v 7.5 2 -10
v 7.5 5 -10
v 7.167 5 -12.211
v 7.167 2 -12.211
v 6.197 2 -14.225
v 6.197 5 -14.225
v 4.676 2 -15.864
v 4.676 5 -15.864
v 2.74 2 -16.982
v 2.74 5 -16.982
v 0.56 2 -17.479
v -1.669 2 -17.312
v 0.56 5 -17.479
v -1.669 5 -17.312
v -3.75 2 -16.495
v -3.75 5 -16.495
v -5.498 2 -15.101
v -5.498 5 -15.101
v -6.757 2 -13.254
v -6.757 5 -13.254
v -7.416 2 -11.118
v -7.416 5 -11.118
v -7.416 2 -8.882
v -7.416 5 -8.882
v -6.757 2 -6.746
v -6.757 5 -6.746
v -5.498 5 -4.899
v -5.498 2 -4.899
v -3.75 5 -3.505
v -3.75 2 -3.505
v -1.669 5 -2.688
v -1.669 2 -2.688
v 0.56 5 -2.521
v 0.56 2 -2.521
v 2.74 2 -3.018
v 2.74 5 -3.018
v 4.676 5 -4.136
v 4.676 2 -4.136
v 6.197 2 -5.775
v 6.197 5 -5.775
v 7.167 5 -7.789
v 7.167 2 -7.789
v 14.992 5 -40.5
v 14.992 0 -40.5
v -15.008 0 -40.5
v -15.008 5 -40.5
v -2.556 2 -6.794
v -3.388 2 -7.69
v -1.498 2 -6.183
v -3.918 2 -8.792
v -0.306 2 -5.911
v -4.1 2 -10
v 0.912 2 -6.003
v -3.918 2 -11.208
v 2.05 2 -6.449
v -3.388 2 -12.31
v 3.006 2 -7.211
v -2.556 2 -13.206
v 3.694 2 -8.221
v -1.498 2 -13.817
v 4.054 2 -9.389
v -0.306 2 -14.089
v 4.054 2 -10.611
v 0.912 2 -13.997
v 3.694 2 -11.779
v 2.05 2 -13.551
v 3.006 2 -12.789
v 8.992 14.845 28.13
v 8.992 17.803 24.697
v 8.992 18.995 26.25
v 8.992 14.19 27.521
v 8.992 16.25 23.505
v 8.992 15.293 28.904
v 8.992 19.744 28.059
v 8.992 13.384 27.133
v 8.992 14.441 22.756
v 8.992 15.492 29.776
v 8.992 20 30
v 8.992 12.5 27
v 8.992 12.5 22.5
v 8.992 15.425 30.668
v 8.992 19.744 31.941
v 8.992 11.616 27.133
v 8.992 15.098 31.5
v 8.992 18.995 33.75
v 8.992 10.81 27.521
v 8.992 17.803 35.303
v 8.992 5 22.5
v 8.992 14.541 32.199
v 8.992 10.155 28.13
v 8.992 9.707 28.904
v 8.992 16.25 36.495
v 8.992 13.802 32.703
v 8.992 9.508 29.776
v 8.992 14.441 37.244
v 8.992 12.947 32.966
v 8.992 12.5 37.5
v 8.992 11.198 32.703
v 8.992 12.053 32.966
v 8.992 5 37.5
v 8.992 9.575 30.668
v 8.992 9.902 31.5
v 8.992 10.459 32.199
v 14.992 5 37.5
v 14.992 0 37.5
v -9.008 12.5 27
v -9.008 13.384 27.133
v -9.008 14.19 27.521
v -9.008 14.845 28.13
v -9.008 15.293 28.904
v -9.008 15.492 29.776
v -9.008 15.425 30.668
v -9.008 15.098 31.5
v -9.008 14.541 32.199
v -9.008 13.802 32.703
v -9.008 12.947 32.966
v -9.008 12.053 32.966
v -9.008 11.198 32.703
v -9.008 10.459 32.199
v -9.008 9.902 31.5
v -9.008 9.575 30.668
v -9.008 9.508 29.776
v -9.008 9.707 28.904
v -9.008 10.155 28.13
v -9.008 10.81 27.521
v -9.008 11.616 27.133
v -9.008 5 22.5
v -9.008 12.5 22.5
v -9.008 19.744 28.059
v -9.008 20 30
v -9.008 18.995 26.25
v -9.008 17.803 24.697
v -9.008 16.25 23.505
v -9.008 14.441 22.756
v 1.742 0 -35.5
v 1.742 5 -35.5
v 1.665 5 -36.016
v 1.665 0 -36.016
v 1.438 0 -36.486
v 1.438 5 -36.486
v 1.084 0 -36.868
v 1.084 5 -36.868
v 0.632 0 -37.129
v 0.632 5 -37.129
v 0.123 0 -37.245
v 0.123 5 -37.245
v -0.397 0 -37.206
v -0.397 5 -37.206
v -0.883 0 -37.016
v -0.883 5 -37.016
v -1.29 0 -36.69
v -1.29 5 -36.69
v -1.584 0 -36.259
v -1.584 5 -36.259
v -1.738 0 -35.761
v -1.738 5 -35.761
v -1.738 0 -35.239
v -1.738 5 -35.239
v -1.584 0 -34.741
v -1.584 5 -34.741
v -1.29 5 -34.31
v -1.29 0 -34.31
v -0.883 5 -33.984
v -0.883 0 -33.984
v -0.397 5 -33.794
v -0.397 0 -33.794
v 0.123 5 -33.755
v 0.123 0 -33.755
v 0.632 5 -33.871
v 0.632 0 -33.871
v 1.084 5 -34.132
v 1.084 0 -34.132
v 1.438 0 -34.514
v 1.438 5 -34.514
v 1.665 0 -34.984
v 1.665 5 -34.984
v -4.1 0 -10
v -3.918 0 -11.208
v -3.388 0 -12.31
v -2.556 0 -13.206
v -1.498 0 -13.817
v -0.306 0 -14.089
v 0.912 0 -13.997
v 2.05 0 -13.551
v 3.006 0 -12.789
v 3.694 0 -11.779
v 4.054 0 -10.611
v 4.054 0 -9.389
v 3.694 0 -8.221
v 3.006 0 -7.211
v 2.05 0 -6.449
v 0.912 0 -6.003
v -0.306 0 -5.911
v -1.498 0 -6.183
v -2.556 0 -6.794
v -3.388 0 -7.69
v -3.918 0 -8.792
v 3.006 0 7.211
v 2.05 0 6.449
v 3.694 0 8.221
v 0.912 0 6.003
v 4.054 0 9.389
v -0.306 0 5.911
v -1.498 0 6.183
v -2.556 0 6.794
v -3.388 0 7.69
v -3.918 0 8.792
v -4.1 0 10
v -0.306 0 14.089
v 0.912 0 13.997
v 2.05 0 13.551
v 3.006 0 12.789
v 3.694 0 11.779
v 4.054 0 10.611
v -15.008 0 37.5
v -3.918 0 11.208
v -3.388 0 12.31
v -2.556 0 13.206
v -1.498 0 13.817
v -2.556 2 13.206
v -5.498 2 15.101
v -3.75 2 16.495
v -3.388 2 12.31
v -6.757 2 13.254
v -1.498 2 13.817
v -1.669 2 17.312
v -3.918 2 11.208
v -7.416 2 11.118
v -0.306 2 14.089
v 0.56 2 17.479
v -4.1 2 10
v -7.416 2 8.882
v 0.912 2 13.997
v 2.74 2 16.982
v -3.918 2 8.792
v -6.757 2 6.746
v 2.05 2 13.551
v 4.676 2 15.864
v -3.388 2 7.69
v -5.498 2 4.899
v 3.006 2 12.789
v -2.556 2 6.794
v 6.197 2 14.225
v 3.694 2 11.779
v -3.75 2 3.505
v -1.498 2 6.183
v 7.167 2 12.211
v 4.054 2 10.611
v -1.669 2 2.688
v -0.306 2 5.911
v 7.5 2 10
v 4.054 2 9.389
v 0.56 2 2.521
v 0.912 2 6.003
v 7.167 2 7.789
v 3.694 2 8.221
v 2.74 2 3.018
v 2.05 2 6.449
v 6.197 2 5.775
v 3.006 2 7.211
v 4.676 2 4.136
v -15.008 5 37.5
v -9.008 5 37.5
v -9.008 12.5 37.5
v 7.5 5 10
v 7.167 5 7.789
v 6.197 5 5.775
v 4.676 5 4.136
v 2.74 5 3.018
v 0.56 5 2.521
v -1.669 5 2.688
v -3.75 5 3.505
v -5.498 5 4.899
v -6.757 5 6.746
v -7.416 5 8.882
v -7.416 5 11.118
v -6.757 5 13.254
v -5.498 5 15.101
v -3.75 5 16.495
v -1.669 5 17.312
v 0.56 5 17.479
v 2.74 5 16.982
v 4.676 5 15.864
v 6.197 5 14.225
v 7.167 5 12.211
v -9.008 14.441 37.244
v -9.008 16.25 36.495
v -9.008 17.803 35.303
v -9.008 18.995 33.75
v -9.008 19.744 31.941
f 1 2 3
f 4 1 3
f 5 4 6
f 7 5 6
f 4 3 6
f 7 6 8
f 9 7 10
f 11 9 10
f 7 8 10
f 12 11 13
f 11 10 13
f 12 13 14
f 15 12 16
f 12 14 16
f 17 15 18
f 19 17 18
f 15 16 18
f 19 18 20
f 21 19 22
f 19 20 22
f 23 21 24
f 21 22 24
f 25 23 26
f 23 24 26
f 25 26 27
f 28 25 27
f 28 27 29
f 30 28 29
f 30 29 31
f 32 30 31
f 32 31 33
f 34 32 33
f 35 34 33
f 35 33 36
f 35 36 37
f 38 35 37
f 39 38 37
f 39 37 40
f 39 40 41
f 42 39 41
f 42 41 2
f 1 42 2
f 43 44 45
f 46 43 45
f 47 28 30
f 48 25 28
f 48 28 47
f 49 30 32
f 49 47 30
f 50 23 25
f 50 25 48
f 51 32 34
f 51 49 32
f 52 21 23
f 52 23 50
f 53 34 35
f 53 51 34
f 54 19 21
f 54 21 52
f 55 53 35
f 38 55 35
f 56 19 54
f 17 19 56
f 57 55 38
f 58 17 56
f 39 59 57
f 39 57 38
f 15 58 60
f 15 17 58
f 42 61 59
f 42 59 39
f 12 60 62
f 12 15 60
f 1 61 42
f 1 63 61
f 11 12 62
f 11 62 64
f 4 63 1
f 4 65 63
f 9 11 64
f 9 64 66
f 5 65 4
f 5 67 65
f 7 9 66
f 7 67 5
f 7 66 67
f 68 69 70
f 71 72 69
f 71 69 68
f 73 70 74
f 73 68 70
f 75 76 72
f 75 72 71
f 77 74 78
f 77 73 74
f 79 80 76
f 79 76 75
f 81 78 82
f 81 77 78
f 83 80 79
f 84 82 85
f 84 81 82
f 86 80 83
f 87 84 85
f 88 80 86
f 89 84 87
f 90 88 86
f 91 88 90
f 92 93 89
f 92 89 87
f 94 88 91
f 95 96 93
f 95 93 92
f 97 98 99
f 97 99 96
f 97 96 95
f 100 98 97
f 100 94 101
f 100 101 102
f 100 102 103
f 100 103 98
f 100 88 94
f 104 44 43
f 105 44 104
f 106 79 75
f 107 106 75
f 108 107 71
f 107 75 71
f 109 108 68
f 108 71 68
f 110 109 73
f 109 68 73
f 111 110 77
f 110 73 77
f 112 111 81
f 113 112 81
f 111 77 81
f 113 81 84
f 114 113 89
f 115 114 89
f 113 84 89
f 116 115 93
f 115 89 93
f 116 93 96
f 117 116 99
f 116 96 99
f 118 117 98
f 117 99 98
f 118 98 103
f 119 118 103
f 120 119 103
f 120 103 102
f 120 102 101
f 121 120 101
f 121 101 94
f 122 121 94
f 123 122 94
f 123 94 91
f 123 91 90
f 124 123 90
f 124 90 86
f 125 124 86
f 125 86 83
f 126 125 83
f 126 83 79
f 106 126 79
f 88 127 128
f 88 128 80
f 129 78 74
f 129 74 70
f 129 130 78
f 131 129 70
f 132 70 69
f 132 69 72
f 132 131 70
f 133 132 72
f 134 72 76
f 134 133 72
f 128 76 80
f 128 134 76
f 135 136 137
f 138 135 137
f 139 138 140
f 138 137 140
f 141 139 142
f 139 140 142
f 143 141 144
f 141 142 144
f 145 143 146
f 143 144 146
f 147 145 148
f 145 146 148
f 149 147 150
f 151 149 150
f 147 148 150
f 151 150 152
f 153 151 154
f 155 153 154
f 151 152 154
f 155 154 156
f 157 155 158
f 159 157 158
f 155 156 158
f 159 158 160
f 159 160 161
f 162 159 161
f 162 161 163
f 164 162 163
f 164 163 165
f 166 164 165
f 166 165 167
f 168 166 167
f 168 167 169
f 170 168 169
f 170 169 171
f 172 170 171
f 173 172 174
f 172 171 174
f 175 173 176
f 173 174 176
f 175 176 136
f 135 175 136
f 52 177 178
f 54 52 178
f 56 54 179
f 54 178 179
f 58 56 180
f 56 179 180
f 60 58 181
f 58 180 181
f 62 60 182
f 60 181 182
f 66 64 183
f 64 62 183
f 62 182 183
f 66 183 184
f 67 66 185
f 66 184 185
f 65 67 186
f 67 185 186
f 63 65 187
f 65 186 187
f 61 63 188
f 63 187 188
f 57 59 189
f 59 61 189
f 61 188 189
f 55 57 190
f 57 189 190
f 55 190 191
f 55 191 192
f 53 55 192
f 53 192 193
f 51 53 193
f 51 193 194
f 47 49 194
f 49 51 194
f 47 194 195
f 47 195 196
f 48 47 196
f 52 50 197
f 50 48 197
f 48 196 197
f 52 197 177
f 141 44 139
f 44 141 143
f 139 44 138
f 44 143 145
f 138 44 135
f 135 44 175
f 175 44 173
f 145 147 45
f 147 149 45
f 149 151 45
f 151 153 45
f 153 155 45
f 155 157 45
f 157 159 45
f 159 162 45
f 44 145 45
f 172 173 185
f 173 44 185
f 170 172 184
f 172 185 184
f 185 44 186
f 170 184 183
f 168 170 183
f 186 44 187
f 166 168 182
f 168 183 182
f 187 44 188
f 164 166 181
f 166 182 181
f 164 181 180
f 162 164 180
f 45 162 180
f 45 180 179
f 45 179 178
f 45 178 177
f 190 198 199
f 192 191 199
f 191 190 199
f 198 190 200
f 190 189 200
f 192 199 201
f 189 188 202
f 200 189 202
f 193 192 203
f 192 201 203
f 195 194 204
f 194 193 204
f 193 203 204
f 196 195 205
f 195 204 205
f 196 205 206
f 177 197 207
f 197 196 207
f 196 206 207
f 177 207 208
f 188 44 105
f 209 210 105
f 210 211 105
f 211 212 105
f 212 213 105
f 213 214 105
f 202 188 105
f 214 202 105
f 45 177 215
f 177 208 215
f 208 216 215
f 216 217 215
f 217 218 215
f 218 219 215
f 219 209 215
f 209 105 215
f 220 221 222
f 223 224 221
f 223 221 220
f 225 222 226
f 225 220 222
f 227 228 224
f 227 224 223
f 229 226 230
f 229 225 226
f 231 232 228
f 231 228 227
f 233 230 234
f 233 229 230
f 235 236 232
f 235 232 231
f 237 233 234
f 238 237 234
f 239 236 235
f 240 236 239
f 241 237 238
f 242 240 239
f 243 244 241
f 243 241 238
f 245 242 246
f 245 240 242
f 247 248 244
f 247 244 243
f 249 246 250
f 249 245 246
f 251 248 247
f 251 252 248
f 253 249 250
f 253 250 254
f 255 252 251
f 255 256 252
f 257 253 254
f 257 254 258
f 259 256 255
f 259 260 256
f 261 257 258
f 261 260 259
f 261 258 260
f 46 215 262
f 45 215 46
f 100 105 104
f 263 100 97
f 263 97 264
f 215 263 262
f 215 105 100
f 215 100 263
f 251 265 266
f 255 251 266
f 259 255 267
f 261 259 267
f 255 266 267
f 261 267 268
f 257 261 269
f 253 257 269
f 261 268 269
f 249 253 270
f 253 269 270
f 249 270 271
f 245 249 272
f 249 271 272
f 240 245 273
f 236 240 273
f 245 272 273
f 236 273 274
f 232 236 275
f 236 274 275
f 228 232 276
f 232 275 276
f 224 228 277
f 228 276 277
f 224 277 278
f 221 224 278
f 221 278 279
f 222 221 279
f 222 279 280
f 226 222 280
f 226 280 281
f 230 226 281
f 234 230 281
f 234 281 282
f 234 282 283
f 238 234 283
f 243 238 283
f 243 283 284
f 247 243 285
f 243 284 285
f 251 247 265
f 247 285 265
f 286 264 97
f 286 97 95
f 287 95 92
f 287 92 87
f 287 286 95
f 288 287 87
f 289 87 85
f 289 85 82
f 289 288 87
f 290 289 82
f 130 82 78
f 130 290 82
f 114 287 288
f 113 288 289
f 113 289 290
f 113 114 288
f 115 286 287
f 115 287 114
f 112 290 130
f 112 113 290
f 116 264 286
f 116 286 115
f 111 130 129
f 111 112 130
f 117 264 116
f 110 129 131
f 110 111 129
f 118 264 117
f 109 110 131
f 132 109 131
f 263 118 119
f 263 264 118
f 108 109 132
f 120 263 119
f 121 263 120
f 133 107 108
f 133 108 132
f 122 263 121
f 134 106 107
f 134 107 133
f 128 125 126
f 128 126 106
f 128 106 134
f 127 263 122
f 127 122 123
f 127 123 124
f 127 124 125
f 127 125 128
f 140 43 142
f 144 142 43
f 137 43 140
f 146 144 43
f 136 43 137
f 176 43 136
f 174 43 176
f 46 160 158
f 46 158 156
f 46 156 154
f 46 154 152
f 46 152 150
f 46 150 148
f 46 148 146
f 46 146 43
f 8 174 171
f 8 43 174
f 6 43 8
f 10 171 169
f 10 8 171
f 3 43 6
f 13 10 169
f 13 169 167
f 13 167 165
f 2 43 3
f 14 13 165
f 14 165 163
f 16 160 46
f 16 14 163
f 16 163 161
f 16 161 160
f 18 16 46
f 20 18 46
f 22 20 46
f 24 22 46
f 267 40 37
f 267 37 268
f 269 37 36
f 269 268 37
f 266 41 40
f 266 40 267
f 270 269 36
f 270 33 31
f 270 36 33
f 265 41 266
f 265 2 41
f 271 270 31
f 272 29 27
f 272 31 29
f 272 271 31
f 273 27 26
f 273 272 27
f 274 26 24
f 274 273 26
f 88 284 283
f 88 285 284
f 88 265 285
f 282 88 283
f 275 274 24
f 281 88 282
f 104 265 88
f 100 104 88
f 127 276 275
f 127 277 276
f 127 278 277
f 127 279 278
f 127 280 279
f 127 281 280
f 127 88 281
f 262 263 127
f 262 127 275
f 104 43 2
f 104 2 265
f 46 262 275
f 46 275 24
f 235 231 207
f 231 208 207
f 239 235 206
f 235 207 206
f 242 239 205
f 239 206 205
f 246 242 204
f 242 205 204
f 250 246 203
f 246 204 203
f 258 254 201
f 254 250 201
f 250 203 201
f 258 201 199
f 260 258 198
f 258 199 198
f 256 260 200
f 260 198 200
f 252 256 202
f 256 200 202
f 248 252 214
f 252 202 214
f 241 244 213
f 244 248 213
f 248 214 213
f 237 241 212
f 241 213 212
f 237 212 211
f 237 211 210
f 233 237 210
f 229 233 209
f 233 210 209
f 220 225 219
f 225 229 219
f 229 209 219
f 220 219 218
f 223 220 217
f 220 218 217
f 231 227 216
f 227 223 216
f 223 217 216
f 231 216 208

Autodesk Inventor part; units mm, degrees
ref_plane "YZ Plane" through (0, 0, 0) normal (1, 0, 0) x (0, 1, 0)
ref_plane "XZ Plane" through (0, 0, 0) normal (0, 1, 0) x (-1, 0, 0)
ref_plane "XY Plane" through (0, 0, 0) normal (0, 0, 1) x (1, 0, 0)
sketch "Эскиз1" plane through (0, 0, 0) normal (0, 1, 0) x (-1, 0, 0)
  line L0 (-14.9924, 37.5) -> (15.0076, 37.5)
  line L1 (15.0076, 37.5) -> (15.0076, -17.5)
  line L2 (15.0076, -17.5) -> (-14.9924, -17.5)
  line L3 (-14.9924, -17.5) -> (-14.9924, 37.5)
  circle A0 centre (0, -10) radius 4.1
  circle A1 centre (0, 10) radius 4.1
  line L4 (15.0076, -17.5) -> (-14.9924, -17.5)
  line L5 (-14.9924, -17.5) -> (-14.9924, -40.5)
  line L6 (-14.9924, -40.5) -> (15.0076, -40.5)
  line L7 (15.0076, -40.5) -> (15.0076, -17.5)
  point P0 (0, 0)
  dimension "d0" = 30
  dimension "d1" = 55
  dimension "d2" = 8.2
  dimension "d3" = 8.2
  dimension "d4" = 10
  dimension "d5" = 10
  dimension "d11" = 23
extrude "Выдавливание1" add sketch "Эскиз1" along normal blind 5
sketch "Эскиз4" plane through (0, 5, 0) normal (0, 1, 0) x (1, 0, 0)
  line L0 (14.9924, -37.5) -> (-15.0076, -37.5) projected
  line L1 (-0.0076, -37.5) -> (-0.0076, -22.5)
  line L2 (8.9924, -37.5) -> (-9.0076, -37.5)
  line L3 (-9.0076, -37.5) -> (-9.0076, -22.5)
  line L4 (-9.0076, -22.5) -> (8.9924, -22.5)
  line L5 (8.9924, -22.5) -> (8.9924, -37.5)
  line L6 (8.9924, -37.5) -> (-9.0076, -22.5) construction
  line L7 (-9.0076, -37.5) -> (8.9924, -22.5) construction
  point P0 (0, 0)
  point P1 (-0.0076, -30)
  dimension "d19" = 15
  dimension "d20" = 18
  dimension "d21" = 15
extrude "Выдавливание4" add sketch "Эскиз4" along normal blind 15
sketch "Эскиз5" plane through (8.9924, 5, 37.5) normal (1, 0, 0) x (0, 0, -1)
  line L0 (0, 15) -> (15, 15) projected
  line L1 (7.5, 15) -> (7.5, 0)
  line L2 (78, 0) -> (0, 0) projected
  circle A0 centre (7.5, 7.5) radius 3
  point P0 (37.5, -5)
  dimension "d24" = 6
extrude "Выдавливание5" cut sketch "Эскиз5" against normal blind 20
fillet "Сопряжение1" radius 7.5 2 edges at (-0.0076, 20, 22.5) (-0.0076, 20, 37.5)
sketch "Эскиз6" plane through (0, 5, 0) normal (0, 1, 0) x (1, 0, 0)
  line L0 (14.9924, 40.5) -> (-15.0076, 40.5) projected
  line L1 (-0.0076, 40.5) -> (-0.0076, 35.5)
  circle A0 centre (-0.0076, 35.5) radius 1.75
  point P0 (0, 0)
  dimension "d28" = 5
  dimension "d29" = 3.5
extrude "Выдавливание6" cut sketch "Эскиз6" against normal blind 15
sketch "Эскиз7" plane through (0, 5, 0) normal (0, 1, 0) x (1, 0, 0)
  circle A0 centre (0, -10) radius 4.1 projected
  circle A1 centre (0, -10) radius 7.5
  circle A2 centre (0, 10) radius 4.1 projected
  circle A3 centre (0, 10) radius 7.5
  point P0 (0, 0)
  dimension "d32" = 15
  dimension "d33" = 15
extrude "Выдавливание7" cut sketch "Эскиз7" against normal blind 3
properties part number "КВ33.044.601 - Опора держателя катка"
